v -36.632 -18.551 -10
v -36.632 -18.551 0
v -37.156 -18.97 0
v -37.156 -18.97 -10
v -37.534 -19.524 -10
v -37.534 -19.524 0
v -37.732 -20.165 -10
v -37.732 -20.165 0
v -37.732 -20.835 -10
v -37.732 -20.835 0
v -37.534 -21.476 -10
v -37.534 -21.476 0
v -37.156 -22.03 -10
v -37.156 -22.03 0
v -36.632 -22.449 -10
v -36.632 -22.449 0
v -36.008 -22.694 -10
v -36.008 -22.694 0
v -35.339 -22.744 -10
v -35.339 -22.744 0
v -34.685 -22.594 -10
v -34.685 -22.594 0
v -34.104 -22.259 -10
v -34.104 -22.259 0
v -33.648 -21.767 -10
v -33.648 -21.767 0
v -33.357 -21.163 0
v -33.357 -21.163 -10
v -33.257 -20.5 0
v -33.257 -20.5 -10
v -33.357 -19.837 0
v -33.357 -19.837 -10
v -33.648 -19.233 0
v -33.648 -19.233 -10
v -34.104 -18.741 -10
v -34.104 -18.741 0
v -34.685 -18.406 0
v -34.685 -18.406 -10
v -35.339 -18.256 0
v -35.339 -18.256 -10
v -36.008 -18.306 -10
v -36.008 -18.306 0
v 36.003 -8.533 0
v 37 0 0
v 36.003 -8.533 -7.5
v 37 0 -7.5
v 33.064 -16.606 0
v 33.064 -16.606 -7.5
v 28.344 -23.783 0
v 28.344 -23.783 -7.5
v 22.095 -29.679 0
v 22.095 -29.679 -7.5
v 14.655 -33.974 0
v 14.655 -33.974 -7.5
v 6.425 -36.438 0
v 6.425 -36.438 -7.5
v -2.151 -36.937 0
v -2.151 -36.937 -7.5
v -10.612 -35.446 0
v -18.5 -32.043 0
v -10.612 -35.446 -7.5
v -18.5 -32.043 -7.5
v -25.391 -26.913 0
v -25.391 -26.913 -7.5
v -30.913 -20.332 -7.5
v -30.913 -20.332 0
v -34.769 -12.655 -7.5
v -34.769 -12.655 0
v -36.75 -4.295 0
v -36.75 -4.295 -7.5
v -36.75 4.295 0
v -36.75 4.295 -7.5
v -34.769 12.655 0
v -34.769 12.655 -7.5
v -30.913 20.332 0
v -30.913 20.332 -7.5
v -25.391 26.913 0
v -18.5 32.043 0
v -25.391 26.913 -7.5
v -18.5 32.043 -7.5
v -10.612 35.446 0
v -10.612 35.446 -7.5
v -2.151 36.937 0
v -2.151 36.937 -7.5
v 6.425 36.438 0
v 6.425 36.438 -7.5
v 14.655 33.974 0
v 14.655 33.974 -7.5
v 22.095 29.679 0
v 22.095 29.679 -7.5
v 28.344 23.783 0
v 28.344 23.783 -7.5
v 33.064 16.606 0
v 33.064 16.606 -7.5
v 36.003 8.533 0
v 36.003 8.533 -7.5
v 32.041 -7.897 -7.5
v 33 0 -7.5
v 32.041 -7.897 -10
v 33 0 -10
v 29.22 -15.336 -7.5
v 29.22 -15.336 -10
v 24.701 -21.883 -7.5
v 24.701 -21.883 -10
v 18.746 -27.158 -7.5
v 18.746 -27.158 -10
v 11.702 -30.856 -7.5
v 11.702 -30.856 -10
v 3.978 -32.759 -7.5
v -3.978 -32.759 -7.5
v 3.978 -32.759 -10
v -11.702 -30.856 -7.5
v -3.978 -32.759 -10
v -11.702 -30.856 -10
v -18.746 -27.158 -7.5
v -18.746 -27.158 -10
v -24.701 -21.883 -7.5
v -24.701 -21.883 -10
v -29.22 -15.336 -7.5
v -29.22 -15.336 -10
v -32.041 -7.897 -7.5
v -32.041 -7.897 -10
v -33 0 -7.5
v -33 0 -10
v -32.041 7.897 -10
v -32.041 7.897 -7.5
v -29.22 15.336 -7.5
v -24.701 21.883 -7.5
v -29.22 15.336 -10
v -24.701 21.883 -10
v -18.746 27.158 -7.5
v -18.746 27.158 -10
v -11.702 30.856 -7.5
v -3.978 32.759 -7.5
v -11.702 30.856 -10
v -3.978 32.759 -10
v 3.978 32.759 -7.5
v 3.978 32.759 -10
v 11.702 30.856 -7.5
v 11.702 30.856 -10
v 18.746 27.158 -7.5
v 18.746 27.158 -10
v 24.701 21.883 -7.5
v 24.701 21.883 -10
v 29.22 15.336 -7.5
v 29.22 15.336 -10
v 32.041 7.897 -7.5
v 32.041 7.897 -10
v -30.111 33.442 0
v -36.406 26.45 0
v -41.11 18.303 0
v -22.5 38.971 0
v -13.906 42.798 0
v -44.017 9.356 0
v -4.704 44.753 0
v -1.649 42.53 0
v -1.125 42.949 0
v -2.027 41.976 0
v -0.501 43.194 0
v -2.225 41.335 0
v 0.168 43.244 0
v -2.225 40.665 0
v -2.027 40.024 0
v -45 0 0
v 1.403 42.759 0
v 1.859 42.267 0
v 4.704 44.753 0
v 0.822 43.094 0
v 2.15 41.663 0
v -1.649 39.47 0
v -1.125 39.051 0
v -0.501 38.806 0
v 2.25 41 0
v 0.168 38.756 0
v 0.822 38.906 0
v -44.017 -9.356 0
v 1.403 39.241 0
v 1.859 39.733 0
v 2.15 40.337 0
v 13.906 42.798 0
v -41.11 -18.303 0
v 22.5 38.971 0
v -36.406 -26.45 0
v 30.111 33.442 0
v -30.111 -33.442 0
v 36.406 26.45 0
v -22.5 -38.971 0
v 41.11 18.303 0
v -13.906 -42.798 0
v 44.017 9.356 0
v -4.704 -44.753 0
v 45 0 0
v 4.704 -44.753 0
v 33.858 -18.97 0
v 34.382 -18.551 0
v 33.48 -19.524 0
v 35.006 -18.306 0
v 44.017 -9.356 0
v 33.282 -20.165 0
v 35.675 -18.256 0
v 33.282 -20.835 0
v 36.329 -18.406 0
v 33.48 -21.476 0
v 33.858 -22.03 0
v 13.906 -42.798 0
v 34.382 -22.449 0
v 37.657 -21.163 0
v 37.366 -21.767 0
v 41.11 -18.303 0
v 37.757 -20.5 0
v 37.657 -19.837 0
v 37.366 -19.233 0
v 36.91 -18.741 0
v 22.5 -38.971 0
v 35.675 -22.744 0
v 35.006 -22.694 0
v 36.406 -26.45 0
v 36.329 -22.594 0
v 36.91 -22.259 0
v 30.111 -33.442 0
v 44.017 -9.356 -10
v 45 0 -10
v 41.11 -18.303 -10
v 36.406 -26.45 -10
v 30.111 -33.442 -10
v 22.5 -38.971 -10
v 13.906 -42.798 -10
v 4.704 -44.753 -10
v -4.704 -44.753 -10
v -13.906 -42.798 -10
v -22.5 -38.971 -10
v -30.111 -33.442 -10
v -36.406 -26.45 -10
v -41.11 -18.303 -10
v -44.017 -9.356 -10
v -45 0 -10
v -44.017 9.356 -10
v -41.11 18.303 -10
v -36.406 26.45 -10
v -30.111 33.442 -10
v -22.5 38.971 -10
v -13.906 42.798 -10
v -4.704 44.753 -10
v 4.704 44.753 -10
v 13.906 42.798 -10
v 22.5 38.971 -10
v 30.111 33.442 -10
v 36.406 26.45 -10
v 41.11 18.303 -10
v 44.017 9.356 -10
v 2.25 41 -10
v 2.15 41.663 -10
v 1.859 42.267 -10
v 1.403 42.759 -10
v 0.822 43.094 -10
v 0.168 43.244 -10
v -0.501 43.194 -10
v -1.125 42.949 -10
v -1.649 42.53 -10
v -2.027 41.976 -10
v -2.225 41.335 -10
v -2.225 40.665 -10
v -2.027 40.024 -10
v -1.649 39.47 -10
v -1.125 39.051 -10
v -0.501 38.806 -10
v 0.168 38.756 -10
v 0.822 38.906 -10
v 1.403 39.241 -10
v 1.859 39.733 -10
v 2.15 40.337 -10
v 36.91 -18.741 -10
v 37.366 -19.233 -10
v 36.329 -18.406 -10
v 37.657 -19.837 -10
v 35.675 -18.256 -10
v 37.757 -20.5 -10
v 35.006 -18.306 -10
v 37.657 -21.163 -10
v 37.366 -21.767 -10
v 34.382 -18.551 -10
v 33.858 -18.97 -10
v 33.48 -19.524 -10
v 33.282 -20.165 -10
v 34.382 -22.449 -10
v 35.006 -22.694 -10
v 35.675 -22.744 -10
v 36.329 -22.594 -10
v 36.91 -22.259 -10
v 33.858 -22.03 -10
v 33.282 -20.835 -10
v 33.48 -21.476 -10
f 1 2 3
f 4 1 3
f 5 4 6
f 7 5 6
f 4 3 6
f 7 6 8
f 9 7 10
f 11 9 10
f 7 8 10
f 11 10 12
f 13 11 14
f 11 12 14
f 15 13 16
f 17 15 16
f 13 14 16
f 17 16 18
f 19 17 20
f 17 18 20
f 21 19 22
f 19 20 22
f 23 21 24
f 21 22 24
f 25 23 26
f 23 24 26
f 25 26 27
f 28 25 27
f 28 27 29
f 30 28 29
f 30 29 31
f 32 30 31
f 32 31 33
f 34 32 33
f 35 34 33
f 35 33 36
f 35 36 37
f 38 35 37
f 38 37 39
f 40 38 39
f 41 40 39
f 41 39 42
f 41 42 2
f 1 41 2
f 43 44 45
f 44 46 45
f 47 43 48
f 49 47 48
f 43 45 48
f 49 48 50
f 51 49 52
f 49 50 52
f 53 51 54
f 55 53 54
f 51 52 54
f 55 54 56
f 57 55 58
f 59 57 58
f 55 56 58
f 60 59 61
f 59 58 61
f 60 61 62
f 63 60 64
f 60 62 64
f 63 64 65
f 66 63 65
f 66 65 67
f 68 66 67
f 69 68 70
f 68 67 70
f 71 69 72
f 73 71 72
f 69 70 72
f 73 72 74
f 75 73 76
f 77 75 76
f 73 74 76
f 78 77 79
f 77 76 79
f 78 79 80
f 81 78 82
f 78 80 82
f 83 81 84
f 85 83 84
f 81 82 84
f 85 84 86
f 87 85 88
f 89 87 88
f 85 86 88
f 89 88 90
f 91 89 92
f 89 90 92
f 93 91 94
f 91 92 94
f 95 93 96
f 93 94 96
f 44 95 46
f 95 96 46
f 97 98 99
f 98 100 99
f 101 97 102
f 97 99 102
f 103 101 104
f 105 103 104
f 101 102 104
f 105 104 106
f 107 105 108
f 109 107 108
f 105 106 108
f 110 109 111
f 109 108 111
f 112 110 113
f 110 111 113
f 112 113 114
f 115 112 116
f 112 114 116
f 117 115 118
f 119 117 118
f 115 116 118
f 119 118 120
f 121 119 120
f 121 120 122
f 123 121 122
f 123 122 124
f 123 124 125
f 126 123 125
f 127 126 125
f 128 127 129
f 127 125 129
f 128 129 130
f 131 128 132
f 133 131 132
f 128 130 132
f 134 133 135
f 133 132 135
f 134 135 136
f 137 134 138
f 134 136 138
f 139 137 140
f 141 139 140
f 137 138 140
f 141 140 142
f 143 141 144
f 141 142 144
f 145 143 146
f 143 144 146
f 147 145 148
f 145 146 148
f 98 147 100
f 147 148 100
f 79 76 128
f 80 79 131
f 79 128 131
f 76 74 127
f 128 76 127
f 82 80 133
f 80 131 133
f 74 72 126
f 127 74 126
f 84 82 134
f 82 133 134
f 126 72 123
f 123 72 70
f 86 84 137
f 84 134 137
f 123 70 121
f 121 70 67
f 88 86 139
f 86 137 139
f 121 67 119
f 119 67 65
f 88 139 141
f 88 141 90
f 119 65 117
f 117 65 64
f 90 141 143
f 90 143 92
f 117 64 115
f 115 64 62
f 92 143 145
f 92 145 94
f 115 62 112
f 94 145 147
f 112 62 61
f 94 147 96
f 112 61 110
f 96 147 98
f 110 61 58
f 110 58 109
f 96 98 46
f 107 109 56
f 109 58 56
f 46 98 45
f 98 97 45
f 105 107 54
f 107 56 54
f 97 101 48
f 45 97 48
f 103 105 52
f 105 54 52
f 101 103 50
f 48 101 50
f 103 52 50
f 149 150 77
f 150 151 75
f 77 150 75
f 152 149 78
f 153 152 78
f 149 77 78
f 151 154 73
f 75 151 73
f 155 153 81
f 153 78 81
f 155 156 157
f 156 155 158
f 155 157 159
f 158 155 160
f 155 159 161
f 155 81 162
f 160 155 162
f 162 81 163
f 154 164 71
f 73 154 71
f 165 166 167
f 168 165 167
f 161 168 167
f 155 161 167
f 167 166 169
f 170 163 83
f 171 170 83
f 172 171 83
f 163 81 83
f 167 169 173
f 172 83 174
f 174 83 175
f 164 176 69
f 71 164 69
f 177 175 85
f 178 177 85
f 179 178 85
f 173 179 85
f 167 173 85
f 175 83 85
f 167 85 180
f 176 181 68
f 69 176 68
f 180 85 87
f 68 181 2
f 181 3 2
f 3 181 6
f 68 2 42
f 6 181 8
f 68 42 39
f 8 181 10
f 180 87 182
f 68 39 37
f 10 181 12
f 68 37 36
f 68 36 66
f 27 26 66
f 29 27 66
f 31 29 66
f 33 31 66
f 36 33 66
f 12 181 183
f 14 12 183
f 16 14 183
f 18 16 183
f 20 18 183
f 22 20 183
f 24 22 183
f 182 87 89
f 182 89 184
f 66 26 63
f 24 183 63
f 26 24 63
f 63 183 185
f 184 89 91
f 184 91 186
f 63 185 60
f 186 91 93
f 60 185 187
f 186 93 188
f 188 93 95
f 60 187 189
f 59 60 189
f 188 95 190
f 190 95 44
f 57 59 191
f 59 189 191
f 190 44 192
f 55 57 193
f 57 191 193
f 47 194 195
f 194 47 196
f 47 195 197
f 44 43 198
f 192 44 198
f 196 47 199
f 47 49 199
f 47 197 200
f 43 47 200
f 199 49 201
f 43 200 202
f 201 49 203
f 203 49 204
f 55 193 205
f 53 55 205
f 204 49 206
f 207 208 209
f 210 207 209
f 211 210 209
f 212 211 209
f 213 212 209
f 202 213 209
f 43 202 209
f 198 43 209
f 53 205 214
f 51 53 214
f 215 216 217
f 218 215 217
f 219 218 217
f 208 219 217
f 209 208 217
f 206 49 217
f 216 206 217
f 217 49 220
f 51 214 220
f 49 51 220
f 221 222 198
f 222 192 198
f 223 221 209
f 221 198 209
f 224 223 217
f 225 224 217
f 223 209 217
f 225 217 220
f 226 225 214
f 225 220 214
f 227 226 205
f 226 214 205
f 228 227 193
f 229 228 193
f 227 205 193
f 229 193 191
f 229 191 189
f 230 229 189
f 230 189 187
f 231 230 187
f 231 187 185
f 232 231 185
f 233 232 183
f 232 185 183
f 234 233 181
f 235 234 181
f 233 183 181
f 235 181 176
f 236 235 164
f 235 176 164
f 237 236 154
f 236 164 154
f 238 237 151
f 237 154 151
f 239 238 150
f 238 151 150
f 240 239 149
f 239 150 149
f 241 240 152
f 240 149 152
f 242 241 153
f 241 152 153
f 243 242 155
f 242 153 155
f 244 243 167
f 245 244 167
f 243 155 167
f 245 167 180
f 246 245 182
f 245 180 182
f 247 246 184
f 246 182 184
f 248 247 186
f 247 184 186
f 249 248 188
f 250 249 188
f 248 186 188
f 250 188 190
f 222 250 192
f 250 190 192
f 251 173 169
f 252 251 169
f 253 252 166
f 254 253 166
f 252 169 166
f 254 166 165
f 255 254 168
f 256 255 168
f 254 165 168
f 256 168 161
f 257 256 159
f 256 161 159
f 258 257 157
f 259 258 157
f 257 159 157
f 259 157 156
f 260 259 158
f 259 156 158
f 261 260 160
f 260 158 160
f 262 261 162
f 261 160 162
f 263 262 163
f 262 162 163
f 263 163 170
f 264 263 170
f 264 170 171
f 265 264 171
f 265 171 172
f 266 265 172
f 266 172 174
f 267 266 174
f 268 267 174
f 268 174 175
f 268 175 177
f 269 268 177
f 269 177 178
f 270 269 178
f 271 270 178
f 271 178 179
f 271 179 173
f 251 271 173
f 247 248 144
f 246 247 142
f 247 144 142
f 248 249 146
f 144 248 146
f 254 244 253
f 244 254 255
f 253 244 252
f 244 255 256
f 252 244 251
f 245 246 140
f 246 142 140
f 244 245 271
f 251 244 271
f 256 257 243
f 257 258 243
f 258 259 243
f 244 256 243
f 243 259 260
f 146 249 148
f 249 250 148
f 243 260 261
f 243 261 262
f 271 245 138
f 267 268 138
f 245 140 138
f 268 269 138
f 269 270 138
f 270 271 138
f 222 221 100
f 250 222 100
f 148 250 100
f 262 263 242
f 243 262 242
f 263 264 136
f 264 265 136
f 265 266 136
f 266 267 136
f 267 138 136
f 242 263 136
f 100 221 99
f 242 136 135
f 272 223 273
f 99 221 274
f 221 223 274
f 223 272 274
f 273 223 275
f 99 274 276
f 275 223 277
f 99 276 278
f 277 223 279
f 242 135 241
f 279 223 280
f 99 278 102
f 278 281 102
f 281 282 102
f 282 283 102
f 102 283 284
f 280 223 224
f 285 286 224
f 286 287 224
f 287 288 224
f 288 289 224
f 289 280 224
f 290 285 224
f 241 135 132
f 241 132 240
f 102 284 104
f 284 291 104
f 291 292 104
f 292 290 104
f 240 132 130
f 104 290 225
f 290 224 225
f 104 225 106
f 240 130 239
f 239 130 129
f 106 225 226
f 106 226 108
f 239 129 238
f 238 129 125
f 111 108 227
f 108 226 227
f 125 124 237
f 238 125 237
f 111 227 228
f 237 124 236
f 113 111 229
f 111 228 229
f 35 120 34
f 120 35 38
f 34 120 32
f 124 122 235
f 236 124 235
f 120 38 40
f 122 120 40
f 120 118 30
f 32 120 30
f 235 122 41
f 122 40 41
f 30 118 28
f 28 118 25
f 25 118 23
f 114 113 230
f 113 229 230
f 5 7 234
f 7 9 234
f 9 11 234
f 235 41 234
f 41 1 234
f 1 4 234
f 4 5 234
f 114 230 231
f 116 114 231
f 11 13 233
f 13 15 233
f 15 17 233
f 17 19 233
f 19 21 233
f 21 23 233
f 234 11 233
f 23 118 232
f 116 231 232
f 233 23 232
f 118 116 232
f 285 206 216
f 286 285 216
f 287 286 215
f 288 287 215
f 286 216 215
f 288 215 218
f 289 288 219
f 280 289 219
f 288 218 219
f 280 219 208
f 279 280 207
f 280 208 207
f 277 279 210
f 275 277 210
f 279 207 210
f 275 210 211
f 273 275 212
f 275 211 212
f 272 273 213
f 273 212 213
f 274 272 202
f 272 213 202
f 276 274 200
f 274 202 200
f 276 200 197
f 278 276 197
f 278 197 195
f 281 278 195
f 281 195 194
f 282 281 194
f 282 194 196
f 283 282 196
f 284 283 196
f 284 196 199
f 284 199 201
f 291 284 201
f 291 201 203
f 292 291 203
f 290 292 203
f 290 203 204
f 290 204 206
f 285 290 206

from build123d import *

# Parameters (mm, degrees)
ESQUISSE2_R                  = 2.25
ENL_V_MAT_EXTRU_1_DEPTH      = 65.420493634
R_P_TITION_CIRCULAIRE1_COUNT = 3


with BuildPart() as part:
    # Esquisse1 → Base-Révolution (revolve)
    with BuildSketch(Plane(origin=(0, 0, 0), x_dir=(1, 0, 0), z_dir=(0, 1, 0))):
        Polygon((33, 10), (45, 10), (45, 0), (37, 0), (37, 7.5), (33, 7.5), align=None)
    revolve(axis=Axis((0, 0, 30), (0, 0, -1)))

    # Esquisse2 → Enlèv. mat.-Extru.1 (cut, through all)
    with BuildSketch(Plane.XY):
        with Locations((0, 41)):
            Circle(ESQUISSE2_R)
    enl_v_mat_extru_1 = extrude(amount=-ENL_V_MAT_EXTRU_1_DEPTH, mode=Mode.SUBTRACT)

    # Répétition circulaire1: Enlèv. mat.-Extru.1 ×3 about axis
    r_p_tition_circulaire1_axis = Axis((0, 0, 0), (0, 0, 1))
    for i in range(1, R_P_TITION_CIRCULAIRE1_COUNT):
        add(enl_v_mat_extru_1.rotate(r_p_tition_circulaire1_axis, i * 360 / R_P_TITION_CIRCULAIRE1_COUNT), mode=Mode.SUBTRACT)


solid = part.part
